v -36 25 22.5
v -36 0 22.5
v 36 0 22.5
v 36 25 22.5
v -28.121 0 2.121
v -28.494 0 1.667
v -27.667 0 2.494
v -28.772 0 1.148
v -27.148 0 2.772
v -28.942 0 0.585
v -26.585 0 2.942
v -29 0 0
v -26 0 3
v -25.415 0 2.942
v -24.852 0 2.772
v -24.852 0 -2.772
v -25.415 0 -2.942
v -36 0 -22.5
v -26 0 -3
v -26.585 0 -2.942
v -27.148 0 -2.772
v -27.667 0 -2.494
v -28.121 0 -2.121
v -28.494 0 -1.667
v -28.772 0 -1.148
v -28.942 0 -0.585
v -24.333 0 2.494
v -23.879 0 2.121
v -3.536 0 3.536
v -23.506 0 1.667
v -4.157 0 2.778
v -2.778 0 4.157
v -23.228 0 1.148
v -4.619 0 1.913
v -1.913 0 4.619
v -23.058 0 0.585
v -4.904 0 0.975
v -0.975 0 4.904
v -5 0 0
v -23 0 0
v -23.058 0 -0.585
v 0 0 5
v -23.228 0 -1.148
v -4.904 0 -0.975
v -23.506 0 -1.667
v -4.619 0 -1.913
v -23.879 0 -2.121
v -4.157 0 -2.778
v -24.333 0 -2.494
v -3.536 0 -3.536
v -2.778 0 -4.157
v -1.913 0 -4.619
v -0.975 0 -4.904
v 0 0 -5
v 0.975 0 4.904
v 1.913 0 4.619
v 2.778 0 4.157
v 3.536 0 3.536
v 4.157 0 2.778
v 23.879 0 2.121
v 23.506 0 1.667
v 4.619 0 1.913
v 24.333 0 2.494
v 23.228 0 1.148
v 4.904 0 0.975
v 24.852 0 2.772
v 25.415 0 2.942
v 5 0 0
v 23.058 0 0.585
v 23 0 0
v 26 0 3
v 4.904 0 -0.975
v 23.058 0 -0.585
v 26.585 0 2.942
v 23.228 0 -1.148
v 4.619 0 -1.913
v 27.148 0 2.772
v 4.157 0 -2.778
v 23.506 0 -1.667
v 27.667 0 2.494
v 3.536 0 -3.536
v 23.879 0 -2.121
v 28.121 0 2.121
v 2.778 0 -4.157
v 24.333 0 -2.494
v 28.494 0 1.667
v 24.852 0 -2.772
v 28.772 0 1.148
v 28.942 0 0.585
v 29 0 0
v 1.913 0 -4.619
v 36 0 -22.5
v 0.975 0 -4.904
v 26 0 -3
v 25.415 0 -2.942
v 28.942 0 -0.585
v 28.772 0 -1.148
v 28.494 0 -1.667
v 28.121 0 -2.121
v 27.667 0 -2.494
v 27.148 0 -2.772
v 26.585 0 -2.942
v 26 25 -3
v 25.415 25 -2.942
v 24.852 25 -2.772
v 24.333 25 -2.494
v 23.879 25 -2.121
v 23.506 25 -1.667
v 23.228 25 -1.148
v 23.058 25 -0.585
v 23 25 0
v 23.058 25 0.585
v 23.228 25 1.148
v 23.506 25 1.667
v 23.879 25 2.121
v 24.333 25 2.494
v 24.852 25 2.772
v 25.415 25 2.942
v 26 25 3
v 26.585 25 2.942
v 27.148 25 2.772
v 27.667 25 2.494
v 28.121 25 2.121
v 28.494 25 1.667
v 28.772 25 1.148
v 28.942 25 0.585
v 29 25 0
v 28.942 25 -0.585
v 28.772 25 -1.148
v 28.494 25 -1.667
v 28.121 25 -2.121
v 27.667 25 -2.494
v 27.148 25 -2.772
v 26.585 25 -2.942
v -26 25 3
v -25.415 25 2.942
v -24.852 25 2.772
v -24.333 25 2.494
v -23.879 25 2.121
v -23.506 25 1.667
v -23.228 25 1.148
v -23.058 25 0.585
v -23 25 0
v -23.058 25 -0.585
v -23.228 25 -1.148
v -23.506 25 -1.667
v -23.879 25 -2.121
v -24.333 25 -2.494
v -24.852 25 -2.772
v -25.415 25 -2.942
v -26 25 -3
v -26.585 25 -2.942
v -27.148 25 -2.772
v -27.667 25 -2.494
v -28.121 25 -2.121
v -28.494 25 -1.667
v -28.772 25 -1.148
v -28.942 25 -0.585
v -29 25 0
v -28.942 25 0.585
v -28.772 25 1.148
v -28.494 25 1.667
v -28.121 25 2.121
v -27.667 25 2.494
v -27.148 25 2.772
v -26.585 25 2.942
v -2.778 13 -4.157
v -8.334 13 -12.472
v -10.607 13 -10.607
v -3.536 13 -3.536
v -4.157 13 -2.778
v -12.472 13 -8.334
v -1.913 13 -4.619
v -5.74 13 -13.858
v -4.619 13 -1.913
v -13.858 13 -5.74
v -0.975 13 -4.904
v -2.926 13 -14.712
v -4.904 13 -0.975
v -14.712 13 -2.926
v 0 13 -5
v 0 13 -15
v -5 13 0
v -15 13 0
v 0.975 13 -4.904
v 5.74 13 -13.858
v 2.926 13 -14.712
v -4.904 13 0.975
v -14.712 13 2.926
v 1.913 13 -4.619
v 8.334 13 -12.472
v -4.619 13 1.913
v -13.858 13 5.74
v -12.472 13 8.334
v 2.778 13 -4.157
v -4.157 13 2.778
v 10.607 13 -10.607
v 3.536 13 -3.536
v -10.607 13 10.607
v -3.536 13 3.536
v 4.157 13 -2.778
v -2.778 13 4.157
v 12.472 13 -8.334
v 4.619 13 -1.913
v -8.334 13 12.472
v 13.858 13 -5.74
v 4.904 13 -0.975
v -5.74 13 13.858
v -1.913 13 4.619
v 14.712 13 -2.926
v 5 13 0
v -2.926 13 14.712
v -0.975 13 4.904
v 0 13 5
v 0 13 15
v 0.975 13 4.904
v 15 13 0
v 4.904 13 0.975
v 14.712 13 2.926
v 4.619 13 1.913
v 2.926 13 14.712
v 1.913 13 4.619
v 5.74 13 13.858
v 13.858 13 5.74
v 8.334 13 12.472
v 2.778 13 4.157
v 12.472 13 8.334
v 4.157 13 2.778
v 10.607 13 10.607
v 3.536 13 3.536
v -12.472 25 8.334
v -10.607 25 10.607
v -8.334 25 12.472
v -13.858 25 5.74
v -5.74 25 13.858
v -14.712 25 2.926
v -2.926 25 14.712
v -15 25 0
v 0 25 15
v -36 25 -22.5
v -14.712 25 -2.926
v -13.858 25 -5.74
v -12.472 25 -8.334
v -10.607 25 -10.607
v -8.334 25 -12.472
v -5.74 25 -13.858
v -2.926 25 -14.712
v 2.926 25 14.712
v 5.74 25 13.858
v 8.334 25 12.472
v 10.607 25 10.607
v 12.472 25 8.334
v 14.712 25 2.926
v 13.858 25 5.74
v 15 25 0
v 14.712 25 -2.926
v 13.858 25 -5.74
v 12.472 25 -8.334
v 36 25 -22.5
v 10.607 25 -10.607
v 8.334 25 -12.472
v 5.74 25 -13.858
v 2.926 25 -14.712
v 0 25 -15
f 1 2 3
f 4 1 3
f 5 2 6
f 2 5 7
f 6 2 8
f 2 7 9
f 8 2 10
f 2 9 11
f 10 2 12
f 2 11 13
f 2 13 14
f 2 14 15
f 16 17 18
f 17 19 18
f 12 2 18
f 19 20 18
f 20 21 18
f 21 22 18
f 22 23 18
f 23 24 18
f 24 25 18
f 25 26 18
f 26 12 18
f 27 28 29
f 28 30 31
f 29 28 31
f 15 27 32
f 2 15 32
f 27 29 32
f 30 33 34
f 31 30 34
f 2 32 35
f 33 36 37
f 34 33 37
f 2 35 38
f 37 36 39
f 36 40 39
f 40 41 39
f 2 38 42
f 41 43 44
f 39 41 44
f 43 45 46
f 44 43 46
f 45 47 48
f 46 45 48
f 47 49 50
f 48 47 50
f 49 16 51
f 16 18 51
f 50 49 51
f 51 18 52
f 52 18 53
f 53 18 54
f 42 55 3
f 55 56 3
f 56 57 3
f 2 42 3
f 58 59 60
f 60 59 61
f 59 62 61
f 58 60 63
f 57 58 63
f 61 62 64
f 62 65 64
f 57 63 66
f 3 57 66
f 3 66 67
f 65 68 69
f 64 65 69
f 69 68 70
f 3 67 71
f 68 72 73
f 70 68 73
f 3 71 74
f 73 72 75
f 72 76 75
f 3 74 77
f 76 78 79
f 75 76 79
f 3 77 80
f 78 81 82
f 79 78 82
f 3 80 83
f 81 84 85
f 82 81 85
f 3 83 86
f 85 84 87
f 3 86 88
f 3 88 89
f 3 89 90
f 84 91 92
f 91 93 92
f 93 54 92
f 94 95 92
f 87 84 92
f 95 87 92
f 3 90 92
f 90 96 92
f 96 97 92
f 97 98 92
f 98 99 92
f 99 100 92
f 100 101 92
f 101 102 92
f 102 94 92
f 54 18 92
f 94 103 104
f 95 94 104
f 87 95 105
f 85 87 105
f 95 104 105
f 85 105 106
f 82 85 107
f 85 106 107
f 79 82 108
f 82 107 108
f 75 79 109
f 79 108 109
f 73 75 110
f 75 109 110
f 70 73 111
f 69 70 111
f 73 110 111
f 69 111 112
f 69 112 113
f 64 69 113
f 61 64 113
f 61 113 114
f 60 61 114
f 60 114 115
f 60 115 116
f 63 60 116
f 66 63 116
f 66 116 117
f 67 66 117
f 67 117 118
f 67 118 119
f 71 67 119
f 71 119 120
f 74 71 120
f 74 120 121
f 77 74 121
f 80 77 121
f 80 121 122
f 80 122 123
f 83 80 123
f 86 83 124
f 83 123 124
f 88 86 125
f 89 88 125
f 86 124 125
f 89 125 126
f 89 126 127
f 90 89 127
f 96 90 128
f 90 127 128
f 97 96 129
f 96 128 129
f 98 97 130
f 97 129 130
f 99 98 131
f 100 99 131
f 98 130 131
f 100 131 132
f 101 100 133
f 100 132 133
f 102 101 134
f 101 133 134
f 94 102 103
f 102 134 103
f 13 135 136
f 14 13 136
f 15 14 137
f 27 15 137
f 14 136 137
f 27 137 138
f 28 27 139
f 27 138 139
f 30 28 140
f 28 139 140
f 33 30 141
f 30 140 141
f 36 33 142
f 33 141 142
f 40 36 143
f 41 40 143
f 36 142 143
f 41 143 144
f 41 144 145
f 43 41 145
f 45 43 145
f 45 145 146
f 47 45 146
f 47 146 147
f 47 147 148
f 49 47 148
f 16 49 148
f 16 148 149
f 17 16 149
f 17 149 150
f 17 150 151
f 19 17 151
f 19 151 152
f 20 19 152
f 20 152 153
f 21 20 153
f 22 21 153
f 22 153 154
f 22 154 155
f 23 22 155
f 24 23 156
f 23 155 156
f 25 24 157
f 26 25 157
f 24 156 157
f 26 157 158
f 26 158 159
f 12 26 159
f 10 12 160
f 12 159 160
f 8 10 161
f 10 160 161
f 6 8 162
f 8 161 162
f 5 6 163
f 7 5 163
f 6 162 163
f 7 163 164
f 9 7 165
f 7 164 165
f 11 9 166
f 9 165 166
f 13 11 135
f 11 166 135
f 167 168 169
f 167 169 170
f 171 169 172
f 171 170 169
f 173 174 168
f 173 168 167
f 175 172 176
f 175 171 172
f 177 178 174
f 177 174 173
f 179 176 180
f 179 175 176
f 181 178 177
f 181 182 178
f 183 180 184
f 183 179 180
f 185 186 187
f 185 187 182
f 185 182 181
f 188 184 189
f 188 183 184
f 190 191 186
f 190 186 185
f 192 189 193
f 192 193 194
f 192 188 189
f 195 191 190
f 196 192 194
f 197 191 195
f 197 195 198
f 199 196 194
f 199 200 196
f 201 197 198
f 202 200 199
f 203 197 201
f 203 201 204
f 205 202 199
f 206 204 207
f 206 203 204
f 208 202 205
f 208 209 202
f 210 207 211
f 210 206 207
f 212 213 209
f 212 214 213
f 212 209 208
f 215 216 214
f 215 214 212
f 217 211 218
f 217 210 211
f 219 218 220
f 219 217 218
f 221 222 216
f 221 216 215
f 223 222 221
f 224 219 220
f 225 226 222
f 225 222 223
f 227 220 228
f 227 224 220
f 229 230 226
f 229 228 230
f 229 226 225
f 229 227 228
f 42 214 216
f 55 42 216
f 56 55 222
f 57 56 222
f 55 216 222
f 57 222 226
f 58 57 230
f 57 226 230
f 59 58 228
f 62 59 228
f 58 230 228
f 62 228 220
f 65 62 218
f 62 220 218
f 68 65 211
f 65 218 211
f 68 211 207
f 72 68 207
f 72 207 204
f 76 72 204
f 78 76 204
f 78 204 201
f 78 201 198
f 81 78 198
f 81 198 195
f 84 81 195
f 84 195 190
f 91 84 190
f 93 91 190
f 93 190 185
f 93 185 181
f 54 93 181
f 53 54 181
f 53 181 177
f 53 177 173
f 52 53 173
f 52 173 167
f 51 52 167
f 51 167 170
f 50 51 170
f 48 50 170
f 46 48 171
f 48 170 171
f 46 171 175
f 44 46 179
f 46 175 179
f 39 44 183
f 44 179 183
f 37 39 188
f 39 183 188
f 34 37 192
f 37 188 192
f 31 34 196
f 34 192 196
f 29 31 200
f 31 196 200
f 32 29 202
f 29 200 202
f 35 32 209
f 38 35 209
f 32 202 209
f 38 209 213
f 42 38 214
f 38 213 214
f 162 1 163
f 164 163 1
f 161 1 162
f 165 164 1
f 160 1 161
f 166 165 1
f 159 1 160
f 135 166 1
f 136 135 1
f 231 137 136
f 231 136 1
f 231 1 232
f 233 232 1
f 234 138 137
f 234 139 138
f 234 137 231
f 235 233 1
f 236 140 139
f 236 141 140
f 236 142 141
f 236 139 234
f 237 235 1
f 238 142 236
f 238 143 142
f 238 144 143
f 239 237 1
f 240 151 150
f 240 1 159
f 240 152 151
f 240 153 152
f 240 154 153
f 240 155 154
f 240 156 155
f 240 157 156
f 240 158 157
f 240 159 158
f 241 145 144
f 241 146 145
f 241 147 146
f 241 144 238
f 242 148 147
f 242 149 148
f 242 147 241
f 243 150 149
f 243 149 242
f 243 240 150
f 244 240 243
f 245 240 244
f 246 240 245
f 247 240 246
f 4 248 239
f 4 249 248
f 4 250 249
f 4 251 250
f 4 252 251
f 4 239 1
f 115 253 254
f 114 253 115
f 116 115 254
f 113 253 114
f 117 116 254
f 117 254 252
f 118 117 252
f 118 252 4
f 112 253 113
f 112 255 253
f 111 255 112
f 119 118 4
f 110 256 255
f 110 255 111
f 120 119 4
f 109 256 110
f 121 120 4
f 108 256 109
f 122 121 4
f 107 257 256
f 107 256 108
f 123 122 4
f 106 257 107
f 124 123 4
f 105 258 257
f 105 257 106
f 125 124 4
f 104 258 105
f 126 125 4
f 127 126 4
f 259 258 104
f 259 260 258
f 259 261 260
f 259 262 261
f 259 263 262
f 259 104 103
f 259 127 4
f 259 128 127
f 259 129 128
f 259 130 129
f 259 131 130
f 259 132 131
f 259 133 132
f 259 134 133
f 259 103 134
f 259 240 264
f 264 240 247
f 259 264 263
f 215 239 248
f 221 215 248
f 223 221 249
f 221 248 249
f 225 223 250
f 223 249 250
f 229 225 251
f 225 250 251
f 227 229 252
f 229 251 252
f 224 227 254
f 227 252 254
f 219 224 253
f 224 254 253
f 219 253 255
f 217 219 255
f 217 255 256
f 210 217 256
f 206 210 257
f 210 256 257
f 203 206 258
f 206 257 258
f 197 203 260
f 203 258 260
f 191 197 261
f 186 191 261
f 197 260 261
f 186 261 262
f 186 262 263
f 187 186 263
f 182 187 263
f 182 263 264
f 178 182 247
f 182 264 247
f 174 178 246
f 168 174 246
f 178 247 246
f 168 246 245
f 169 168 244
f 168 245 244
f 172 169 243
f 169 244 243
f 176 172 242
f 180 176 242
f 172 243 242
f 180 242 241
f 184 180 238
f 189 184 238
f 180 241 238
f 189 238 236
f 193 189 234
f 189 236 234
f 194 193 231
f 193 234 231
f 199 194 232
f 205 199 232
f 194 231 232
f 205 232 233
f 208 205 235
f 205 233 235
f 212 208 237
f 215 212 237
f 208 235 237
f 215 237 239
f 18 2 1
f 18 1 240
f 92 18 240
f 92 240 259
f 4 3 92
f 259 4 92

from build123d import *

# Parameters (mm, degrees)
SKETCH1_W           = 72
SKETCH1_H           = 45
BOSS_EXTRUDE1_DEPTH = 25
SKETCH2_R           = 5
CUT_EXTRUDE1_DEPTH  = 50.267129001
SKETCH3_R           = 3
CUT_EXTRUDE2_DEPTH  = 50.267129001
SKETCH4_R           = 15
CUT_EXTRUDE3_DEPTH  = 12


with BuildPart() as part:
    # Sketch1 → Boss-Extrude1 (new body)
    with BuildSketch(Plane(origin=(0, 0, 0), x_dir=(1, 0, 0), z_dir=(0, 1, 0))):
        Rectangle(SKETCH1_W, SKETCH1_H)
    extrude(amount=BOSS_EXTRUDE1_DEPTH)

    # Sketch2 → Cut-Extrude1 (cut, through all)
    with BuildSketch(Plane(origin=(0, 25, 0), x_dir=(1, 0, 0), z_dir=(0, 1, 0))):
        with Locations(Location((0, 0, 0), (0, 0, 270))):
            Circle(SKETCH2_R)
    extrude(amount=-CUT_EXTRUDE1_DEPTH, mode=Mode.SUBTRACT)

    # Sketch3 → Cut-Extrude2 (cut, through all)
    with BuildSketch(Plane(origin=(0, 25, 0), x_dir=(1, 0, 0), z_dir=(0, 1, 0))):
        with Locations(Location((-26, 0, 0), (0, 0, 270))):
            Circle(SKETCH3_R)
        with Locations(Location((26, 0, 0), (0, 0, 90))):
            Circle(SKETCH3_R)
    extrude(amount=-CUT_EXTRUDE2_DEPTH, mode=Mode.SUBTRACT)

    # Sketch4 → Cut-Extrude3 (cut)
    with BuildSketch(Plane(origin=(0, 25, 0), x_dir=(1, 0, 0), z_dir=(0, 1, 0))):
        with Locations(Location((0, 0, 0), (0, 0, 270))):
            Circle(SKETCH4_R)
    extrude(amount=-CUT_EXTRUDE3_DEPTH, mode=Mode.SUBTRACT)


solid = part.part
